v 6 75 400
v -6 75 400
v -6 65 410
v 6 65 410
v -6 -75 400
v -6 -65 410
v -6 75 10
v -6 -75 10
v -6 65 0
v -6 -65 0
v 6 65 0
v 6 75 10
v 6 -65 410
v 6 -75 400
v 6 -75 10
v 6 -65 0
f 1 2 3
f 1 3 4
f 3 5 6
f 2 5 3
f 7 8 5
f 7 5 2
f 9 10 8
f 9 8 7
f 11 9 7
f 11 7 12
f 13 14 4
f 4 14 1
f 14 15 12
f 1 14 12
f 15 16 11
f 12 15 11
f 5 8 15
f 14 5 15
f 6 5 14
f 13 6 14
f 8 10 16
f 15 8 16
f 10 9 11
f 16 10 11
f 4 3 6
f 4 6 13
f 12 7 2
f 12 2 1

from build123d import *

# Parameters (mm, degrees)
ESQUISSE1_W        = 12
ESQUISSE1_H        = 150
BOSS_EXTRU_1_DEPTH = 410
CHANFREIN1_SIZE    = 10


with BuildPart() as part:
    # Esquisse1 → Boss.-Extru.1 (new body)
    with BuildSketch(Plane.XY):
        Rectangle(ESQUISSE1_W, ESQUISSE1_H)
    extrude(amount=BOSS_EXTRU_1_DEPTH)

    # Chanfrein1
    chanfrein1_edges = [part.edges().sort_by_distance(p)[0] for p in [
        (0, -75, 410),
        (0, -75, 0),
        (0, 75, 0),
        (0, 75, 410),
    ]]
    chamfer(chanfrein1_edges, length=CHANFREIN1_SIZE)


solid = part.part
